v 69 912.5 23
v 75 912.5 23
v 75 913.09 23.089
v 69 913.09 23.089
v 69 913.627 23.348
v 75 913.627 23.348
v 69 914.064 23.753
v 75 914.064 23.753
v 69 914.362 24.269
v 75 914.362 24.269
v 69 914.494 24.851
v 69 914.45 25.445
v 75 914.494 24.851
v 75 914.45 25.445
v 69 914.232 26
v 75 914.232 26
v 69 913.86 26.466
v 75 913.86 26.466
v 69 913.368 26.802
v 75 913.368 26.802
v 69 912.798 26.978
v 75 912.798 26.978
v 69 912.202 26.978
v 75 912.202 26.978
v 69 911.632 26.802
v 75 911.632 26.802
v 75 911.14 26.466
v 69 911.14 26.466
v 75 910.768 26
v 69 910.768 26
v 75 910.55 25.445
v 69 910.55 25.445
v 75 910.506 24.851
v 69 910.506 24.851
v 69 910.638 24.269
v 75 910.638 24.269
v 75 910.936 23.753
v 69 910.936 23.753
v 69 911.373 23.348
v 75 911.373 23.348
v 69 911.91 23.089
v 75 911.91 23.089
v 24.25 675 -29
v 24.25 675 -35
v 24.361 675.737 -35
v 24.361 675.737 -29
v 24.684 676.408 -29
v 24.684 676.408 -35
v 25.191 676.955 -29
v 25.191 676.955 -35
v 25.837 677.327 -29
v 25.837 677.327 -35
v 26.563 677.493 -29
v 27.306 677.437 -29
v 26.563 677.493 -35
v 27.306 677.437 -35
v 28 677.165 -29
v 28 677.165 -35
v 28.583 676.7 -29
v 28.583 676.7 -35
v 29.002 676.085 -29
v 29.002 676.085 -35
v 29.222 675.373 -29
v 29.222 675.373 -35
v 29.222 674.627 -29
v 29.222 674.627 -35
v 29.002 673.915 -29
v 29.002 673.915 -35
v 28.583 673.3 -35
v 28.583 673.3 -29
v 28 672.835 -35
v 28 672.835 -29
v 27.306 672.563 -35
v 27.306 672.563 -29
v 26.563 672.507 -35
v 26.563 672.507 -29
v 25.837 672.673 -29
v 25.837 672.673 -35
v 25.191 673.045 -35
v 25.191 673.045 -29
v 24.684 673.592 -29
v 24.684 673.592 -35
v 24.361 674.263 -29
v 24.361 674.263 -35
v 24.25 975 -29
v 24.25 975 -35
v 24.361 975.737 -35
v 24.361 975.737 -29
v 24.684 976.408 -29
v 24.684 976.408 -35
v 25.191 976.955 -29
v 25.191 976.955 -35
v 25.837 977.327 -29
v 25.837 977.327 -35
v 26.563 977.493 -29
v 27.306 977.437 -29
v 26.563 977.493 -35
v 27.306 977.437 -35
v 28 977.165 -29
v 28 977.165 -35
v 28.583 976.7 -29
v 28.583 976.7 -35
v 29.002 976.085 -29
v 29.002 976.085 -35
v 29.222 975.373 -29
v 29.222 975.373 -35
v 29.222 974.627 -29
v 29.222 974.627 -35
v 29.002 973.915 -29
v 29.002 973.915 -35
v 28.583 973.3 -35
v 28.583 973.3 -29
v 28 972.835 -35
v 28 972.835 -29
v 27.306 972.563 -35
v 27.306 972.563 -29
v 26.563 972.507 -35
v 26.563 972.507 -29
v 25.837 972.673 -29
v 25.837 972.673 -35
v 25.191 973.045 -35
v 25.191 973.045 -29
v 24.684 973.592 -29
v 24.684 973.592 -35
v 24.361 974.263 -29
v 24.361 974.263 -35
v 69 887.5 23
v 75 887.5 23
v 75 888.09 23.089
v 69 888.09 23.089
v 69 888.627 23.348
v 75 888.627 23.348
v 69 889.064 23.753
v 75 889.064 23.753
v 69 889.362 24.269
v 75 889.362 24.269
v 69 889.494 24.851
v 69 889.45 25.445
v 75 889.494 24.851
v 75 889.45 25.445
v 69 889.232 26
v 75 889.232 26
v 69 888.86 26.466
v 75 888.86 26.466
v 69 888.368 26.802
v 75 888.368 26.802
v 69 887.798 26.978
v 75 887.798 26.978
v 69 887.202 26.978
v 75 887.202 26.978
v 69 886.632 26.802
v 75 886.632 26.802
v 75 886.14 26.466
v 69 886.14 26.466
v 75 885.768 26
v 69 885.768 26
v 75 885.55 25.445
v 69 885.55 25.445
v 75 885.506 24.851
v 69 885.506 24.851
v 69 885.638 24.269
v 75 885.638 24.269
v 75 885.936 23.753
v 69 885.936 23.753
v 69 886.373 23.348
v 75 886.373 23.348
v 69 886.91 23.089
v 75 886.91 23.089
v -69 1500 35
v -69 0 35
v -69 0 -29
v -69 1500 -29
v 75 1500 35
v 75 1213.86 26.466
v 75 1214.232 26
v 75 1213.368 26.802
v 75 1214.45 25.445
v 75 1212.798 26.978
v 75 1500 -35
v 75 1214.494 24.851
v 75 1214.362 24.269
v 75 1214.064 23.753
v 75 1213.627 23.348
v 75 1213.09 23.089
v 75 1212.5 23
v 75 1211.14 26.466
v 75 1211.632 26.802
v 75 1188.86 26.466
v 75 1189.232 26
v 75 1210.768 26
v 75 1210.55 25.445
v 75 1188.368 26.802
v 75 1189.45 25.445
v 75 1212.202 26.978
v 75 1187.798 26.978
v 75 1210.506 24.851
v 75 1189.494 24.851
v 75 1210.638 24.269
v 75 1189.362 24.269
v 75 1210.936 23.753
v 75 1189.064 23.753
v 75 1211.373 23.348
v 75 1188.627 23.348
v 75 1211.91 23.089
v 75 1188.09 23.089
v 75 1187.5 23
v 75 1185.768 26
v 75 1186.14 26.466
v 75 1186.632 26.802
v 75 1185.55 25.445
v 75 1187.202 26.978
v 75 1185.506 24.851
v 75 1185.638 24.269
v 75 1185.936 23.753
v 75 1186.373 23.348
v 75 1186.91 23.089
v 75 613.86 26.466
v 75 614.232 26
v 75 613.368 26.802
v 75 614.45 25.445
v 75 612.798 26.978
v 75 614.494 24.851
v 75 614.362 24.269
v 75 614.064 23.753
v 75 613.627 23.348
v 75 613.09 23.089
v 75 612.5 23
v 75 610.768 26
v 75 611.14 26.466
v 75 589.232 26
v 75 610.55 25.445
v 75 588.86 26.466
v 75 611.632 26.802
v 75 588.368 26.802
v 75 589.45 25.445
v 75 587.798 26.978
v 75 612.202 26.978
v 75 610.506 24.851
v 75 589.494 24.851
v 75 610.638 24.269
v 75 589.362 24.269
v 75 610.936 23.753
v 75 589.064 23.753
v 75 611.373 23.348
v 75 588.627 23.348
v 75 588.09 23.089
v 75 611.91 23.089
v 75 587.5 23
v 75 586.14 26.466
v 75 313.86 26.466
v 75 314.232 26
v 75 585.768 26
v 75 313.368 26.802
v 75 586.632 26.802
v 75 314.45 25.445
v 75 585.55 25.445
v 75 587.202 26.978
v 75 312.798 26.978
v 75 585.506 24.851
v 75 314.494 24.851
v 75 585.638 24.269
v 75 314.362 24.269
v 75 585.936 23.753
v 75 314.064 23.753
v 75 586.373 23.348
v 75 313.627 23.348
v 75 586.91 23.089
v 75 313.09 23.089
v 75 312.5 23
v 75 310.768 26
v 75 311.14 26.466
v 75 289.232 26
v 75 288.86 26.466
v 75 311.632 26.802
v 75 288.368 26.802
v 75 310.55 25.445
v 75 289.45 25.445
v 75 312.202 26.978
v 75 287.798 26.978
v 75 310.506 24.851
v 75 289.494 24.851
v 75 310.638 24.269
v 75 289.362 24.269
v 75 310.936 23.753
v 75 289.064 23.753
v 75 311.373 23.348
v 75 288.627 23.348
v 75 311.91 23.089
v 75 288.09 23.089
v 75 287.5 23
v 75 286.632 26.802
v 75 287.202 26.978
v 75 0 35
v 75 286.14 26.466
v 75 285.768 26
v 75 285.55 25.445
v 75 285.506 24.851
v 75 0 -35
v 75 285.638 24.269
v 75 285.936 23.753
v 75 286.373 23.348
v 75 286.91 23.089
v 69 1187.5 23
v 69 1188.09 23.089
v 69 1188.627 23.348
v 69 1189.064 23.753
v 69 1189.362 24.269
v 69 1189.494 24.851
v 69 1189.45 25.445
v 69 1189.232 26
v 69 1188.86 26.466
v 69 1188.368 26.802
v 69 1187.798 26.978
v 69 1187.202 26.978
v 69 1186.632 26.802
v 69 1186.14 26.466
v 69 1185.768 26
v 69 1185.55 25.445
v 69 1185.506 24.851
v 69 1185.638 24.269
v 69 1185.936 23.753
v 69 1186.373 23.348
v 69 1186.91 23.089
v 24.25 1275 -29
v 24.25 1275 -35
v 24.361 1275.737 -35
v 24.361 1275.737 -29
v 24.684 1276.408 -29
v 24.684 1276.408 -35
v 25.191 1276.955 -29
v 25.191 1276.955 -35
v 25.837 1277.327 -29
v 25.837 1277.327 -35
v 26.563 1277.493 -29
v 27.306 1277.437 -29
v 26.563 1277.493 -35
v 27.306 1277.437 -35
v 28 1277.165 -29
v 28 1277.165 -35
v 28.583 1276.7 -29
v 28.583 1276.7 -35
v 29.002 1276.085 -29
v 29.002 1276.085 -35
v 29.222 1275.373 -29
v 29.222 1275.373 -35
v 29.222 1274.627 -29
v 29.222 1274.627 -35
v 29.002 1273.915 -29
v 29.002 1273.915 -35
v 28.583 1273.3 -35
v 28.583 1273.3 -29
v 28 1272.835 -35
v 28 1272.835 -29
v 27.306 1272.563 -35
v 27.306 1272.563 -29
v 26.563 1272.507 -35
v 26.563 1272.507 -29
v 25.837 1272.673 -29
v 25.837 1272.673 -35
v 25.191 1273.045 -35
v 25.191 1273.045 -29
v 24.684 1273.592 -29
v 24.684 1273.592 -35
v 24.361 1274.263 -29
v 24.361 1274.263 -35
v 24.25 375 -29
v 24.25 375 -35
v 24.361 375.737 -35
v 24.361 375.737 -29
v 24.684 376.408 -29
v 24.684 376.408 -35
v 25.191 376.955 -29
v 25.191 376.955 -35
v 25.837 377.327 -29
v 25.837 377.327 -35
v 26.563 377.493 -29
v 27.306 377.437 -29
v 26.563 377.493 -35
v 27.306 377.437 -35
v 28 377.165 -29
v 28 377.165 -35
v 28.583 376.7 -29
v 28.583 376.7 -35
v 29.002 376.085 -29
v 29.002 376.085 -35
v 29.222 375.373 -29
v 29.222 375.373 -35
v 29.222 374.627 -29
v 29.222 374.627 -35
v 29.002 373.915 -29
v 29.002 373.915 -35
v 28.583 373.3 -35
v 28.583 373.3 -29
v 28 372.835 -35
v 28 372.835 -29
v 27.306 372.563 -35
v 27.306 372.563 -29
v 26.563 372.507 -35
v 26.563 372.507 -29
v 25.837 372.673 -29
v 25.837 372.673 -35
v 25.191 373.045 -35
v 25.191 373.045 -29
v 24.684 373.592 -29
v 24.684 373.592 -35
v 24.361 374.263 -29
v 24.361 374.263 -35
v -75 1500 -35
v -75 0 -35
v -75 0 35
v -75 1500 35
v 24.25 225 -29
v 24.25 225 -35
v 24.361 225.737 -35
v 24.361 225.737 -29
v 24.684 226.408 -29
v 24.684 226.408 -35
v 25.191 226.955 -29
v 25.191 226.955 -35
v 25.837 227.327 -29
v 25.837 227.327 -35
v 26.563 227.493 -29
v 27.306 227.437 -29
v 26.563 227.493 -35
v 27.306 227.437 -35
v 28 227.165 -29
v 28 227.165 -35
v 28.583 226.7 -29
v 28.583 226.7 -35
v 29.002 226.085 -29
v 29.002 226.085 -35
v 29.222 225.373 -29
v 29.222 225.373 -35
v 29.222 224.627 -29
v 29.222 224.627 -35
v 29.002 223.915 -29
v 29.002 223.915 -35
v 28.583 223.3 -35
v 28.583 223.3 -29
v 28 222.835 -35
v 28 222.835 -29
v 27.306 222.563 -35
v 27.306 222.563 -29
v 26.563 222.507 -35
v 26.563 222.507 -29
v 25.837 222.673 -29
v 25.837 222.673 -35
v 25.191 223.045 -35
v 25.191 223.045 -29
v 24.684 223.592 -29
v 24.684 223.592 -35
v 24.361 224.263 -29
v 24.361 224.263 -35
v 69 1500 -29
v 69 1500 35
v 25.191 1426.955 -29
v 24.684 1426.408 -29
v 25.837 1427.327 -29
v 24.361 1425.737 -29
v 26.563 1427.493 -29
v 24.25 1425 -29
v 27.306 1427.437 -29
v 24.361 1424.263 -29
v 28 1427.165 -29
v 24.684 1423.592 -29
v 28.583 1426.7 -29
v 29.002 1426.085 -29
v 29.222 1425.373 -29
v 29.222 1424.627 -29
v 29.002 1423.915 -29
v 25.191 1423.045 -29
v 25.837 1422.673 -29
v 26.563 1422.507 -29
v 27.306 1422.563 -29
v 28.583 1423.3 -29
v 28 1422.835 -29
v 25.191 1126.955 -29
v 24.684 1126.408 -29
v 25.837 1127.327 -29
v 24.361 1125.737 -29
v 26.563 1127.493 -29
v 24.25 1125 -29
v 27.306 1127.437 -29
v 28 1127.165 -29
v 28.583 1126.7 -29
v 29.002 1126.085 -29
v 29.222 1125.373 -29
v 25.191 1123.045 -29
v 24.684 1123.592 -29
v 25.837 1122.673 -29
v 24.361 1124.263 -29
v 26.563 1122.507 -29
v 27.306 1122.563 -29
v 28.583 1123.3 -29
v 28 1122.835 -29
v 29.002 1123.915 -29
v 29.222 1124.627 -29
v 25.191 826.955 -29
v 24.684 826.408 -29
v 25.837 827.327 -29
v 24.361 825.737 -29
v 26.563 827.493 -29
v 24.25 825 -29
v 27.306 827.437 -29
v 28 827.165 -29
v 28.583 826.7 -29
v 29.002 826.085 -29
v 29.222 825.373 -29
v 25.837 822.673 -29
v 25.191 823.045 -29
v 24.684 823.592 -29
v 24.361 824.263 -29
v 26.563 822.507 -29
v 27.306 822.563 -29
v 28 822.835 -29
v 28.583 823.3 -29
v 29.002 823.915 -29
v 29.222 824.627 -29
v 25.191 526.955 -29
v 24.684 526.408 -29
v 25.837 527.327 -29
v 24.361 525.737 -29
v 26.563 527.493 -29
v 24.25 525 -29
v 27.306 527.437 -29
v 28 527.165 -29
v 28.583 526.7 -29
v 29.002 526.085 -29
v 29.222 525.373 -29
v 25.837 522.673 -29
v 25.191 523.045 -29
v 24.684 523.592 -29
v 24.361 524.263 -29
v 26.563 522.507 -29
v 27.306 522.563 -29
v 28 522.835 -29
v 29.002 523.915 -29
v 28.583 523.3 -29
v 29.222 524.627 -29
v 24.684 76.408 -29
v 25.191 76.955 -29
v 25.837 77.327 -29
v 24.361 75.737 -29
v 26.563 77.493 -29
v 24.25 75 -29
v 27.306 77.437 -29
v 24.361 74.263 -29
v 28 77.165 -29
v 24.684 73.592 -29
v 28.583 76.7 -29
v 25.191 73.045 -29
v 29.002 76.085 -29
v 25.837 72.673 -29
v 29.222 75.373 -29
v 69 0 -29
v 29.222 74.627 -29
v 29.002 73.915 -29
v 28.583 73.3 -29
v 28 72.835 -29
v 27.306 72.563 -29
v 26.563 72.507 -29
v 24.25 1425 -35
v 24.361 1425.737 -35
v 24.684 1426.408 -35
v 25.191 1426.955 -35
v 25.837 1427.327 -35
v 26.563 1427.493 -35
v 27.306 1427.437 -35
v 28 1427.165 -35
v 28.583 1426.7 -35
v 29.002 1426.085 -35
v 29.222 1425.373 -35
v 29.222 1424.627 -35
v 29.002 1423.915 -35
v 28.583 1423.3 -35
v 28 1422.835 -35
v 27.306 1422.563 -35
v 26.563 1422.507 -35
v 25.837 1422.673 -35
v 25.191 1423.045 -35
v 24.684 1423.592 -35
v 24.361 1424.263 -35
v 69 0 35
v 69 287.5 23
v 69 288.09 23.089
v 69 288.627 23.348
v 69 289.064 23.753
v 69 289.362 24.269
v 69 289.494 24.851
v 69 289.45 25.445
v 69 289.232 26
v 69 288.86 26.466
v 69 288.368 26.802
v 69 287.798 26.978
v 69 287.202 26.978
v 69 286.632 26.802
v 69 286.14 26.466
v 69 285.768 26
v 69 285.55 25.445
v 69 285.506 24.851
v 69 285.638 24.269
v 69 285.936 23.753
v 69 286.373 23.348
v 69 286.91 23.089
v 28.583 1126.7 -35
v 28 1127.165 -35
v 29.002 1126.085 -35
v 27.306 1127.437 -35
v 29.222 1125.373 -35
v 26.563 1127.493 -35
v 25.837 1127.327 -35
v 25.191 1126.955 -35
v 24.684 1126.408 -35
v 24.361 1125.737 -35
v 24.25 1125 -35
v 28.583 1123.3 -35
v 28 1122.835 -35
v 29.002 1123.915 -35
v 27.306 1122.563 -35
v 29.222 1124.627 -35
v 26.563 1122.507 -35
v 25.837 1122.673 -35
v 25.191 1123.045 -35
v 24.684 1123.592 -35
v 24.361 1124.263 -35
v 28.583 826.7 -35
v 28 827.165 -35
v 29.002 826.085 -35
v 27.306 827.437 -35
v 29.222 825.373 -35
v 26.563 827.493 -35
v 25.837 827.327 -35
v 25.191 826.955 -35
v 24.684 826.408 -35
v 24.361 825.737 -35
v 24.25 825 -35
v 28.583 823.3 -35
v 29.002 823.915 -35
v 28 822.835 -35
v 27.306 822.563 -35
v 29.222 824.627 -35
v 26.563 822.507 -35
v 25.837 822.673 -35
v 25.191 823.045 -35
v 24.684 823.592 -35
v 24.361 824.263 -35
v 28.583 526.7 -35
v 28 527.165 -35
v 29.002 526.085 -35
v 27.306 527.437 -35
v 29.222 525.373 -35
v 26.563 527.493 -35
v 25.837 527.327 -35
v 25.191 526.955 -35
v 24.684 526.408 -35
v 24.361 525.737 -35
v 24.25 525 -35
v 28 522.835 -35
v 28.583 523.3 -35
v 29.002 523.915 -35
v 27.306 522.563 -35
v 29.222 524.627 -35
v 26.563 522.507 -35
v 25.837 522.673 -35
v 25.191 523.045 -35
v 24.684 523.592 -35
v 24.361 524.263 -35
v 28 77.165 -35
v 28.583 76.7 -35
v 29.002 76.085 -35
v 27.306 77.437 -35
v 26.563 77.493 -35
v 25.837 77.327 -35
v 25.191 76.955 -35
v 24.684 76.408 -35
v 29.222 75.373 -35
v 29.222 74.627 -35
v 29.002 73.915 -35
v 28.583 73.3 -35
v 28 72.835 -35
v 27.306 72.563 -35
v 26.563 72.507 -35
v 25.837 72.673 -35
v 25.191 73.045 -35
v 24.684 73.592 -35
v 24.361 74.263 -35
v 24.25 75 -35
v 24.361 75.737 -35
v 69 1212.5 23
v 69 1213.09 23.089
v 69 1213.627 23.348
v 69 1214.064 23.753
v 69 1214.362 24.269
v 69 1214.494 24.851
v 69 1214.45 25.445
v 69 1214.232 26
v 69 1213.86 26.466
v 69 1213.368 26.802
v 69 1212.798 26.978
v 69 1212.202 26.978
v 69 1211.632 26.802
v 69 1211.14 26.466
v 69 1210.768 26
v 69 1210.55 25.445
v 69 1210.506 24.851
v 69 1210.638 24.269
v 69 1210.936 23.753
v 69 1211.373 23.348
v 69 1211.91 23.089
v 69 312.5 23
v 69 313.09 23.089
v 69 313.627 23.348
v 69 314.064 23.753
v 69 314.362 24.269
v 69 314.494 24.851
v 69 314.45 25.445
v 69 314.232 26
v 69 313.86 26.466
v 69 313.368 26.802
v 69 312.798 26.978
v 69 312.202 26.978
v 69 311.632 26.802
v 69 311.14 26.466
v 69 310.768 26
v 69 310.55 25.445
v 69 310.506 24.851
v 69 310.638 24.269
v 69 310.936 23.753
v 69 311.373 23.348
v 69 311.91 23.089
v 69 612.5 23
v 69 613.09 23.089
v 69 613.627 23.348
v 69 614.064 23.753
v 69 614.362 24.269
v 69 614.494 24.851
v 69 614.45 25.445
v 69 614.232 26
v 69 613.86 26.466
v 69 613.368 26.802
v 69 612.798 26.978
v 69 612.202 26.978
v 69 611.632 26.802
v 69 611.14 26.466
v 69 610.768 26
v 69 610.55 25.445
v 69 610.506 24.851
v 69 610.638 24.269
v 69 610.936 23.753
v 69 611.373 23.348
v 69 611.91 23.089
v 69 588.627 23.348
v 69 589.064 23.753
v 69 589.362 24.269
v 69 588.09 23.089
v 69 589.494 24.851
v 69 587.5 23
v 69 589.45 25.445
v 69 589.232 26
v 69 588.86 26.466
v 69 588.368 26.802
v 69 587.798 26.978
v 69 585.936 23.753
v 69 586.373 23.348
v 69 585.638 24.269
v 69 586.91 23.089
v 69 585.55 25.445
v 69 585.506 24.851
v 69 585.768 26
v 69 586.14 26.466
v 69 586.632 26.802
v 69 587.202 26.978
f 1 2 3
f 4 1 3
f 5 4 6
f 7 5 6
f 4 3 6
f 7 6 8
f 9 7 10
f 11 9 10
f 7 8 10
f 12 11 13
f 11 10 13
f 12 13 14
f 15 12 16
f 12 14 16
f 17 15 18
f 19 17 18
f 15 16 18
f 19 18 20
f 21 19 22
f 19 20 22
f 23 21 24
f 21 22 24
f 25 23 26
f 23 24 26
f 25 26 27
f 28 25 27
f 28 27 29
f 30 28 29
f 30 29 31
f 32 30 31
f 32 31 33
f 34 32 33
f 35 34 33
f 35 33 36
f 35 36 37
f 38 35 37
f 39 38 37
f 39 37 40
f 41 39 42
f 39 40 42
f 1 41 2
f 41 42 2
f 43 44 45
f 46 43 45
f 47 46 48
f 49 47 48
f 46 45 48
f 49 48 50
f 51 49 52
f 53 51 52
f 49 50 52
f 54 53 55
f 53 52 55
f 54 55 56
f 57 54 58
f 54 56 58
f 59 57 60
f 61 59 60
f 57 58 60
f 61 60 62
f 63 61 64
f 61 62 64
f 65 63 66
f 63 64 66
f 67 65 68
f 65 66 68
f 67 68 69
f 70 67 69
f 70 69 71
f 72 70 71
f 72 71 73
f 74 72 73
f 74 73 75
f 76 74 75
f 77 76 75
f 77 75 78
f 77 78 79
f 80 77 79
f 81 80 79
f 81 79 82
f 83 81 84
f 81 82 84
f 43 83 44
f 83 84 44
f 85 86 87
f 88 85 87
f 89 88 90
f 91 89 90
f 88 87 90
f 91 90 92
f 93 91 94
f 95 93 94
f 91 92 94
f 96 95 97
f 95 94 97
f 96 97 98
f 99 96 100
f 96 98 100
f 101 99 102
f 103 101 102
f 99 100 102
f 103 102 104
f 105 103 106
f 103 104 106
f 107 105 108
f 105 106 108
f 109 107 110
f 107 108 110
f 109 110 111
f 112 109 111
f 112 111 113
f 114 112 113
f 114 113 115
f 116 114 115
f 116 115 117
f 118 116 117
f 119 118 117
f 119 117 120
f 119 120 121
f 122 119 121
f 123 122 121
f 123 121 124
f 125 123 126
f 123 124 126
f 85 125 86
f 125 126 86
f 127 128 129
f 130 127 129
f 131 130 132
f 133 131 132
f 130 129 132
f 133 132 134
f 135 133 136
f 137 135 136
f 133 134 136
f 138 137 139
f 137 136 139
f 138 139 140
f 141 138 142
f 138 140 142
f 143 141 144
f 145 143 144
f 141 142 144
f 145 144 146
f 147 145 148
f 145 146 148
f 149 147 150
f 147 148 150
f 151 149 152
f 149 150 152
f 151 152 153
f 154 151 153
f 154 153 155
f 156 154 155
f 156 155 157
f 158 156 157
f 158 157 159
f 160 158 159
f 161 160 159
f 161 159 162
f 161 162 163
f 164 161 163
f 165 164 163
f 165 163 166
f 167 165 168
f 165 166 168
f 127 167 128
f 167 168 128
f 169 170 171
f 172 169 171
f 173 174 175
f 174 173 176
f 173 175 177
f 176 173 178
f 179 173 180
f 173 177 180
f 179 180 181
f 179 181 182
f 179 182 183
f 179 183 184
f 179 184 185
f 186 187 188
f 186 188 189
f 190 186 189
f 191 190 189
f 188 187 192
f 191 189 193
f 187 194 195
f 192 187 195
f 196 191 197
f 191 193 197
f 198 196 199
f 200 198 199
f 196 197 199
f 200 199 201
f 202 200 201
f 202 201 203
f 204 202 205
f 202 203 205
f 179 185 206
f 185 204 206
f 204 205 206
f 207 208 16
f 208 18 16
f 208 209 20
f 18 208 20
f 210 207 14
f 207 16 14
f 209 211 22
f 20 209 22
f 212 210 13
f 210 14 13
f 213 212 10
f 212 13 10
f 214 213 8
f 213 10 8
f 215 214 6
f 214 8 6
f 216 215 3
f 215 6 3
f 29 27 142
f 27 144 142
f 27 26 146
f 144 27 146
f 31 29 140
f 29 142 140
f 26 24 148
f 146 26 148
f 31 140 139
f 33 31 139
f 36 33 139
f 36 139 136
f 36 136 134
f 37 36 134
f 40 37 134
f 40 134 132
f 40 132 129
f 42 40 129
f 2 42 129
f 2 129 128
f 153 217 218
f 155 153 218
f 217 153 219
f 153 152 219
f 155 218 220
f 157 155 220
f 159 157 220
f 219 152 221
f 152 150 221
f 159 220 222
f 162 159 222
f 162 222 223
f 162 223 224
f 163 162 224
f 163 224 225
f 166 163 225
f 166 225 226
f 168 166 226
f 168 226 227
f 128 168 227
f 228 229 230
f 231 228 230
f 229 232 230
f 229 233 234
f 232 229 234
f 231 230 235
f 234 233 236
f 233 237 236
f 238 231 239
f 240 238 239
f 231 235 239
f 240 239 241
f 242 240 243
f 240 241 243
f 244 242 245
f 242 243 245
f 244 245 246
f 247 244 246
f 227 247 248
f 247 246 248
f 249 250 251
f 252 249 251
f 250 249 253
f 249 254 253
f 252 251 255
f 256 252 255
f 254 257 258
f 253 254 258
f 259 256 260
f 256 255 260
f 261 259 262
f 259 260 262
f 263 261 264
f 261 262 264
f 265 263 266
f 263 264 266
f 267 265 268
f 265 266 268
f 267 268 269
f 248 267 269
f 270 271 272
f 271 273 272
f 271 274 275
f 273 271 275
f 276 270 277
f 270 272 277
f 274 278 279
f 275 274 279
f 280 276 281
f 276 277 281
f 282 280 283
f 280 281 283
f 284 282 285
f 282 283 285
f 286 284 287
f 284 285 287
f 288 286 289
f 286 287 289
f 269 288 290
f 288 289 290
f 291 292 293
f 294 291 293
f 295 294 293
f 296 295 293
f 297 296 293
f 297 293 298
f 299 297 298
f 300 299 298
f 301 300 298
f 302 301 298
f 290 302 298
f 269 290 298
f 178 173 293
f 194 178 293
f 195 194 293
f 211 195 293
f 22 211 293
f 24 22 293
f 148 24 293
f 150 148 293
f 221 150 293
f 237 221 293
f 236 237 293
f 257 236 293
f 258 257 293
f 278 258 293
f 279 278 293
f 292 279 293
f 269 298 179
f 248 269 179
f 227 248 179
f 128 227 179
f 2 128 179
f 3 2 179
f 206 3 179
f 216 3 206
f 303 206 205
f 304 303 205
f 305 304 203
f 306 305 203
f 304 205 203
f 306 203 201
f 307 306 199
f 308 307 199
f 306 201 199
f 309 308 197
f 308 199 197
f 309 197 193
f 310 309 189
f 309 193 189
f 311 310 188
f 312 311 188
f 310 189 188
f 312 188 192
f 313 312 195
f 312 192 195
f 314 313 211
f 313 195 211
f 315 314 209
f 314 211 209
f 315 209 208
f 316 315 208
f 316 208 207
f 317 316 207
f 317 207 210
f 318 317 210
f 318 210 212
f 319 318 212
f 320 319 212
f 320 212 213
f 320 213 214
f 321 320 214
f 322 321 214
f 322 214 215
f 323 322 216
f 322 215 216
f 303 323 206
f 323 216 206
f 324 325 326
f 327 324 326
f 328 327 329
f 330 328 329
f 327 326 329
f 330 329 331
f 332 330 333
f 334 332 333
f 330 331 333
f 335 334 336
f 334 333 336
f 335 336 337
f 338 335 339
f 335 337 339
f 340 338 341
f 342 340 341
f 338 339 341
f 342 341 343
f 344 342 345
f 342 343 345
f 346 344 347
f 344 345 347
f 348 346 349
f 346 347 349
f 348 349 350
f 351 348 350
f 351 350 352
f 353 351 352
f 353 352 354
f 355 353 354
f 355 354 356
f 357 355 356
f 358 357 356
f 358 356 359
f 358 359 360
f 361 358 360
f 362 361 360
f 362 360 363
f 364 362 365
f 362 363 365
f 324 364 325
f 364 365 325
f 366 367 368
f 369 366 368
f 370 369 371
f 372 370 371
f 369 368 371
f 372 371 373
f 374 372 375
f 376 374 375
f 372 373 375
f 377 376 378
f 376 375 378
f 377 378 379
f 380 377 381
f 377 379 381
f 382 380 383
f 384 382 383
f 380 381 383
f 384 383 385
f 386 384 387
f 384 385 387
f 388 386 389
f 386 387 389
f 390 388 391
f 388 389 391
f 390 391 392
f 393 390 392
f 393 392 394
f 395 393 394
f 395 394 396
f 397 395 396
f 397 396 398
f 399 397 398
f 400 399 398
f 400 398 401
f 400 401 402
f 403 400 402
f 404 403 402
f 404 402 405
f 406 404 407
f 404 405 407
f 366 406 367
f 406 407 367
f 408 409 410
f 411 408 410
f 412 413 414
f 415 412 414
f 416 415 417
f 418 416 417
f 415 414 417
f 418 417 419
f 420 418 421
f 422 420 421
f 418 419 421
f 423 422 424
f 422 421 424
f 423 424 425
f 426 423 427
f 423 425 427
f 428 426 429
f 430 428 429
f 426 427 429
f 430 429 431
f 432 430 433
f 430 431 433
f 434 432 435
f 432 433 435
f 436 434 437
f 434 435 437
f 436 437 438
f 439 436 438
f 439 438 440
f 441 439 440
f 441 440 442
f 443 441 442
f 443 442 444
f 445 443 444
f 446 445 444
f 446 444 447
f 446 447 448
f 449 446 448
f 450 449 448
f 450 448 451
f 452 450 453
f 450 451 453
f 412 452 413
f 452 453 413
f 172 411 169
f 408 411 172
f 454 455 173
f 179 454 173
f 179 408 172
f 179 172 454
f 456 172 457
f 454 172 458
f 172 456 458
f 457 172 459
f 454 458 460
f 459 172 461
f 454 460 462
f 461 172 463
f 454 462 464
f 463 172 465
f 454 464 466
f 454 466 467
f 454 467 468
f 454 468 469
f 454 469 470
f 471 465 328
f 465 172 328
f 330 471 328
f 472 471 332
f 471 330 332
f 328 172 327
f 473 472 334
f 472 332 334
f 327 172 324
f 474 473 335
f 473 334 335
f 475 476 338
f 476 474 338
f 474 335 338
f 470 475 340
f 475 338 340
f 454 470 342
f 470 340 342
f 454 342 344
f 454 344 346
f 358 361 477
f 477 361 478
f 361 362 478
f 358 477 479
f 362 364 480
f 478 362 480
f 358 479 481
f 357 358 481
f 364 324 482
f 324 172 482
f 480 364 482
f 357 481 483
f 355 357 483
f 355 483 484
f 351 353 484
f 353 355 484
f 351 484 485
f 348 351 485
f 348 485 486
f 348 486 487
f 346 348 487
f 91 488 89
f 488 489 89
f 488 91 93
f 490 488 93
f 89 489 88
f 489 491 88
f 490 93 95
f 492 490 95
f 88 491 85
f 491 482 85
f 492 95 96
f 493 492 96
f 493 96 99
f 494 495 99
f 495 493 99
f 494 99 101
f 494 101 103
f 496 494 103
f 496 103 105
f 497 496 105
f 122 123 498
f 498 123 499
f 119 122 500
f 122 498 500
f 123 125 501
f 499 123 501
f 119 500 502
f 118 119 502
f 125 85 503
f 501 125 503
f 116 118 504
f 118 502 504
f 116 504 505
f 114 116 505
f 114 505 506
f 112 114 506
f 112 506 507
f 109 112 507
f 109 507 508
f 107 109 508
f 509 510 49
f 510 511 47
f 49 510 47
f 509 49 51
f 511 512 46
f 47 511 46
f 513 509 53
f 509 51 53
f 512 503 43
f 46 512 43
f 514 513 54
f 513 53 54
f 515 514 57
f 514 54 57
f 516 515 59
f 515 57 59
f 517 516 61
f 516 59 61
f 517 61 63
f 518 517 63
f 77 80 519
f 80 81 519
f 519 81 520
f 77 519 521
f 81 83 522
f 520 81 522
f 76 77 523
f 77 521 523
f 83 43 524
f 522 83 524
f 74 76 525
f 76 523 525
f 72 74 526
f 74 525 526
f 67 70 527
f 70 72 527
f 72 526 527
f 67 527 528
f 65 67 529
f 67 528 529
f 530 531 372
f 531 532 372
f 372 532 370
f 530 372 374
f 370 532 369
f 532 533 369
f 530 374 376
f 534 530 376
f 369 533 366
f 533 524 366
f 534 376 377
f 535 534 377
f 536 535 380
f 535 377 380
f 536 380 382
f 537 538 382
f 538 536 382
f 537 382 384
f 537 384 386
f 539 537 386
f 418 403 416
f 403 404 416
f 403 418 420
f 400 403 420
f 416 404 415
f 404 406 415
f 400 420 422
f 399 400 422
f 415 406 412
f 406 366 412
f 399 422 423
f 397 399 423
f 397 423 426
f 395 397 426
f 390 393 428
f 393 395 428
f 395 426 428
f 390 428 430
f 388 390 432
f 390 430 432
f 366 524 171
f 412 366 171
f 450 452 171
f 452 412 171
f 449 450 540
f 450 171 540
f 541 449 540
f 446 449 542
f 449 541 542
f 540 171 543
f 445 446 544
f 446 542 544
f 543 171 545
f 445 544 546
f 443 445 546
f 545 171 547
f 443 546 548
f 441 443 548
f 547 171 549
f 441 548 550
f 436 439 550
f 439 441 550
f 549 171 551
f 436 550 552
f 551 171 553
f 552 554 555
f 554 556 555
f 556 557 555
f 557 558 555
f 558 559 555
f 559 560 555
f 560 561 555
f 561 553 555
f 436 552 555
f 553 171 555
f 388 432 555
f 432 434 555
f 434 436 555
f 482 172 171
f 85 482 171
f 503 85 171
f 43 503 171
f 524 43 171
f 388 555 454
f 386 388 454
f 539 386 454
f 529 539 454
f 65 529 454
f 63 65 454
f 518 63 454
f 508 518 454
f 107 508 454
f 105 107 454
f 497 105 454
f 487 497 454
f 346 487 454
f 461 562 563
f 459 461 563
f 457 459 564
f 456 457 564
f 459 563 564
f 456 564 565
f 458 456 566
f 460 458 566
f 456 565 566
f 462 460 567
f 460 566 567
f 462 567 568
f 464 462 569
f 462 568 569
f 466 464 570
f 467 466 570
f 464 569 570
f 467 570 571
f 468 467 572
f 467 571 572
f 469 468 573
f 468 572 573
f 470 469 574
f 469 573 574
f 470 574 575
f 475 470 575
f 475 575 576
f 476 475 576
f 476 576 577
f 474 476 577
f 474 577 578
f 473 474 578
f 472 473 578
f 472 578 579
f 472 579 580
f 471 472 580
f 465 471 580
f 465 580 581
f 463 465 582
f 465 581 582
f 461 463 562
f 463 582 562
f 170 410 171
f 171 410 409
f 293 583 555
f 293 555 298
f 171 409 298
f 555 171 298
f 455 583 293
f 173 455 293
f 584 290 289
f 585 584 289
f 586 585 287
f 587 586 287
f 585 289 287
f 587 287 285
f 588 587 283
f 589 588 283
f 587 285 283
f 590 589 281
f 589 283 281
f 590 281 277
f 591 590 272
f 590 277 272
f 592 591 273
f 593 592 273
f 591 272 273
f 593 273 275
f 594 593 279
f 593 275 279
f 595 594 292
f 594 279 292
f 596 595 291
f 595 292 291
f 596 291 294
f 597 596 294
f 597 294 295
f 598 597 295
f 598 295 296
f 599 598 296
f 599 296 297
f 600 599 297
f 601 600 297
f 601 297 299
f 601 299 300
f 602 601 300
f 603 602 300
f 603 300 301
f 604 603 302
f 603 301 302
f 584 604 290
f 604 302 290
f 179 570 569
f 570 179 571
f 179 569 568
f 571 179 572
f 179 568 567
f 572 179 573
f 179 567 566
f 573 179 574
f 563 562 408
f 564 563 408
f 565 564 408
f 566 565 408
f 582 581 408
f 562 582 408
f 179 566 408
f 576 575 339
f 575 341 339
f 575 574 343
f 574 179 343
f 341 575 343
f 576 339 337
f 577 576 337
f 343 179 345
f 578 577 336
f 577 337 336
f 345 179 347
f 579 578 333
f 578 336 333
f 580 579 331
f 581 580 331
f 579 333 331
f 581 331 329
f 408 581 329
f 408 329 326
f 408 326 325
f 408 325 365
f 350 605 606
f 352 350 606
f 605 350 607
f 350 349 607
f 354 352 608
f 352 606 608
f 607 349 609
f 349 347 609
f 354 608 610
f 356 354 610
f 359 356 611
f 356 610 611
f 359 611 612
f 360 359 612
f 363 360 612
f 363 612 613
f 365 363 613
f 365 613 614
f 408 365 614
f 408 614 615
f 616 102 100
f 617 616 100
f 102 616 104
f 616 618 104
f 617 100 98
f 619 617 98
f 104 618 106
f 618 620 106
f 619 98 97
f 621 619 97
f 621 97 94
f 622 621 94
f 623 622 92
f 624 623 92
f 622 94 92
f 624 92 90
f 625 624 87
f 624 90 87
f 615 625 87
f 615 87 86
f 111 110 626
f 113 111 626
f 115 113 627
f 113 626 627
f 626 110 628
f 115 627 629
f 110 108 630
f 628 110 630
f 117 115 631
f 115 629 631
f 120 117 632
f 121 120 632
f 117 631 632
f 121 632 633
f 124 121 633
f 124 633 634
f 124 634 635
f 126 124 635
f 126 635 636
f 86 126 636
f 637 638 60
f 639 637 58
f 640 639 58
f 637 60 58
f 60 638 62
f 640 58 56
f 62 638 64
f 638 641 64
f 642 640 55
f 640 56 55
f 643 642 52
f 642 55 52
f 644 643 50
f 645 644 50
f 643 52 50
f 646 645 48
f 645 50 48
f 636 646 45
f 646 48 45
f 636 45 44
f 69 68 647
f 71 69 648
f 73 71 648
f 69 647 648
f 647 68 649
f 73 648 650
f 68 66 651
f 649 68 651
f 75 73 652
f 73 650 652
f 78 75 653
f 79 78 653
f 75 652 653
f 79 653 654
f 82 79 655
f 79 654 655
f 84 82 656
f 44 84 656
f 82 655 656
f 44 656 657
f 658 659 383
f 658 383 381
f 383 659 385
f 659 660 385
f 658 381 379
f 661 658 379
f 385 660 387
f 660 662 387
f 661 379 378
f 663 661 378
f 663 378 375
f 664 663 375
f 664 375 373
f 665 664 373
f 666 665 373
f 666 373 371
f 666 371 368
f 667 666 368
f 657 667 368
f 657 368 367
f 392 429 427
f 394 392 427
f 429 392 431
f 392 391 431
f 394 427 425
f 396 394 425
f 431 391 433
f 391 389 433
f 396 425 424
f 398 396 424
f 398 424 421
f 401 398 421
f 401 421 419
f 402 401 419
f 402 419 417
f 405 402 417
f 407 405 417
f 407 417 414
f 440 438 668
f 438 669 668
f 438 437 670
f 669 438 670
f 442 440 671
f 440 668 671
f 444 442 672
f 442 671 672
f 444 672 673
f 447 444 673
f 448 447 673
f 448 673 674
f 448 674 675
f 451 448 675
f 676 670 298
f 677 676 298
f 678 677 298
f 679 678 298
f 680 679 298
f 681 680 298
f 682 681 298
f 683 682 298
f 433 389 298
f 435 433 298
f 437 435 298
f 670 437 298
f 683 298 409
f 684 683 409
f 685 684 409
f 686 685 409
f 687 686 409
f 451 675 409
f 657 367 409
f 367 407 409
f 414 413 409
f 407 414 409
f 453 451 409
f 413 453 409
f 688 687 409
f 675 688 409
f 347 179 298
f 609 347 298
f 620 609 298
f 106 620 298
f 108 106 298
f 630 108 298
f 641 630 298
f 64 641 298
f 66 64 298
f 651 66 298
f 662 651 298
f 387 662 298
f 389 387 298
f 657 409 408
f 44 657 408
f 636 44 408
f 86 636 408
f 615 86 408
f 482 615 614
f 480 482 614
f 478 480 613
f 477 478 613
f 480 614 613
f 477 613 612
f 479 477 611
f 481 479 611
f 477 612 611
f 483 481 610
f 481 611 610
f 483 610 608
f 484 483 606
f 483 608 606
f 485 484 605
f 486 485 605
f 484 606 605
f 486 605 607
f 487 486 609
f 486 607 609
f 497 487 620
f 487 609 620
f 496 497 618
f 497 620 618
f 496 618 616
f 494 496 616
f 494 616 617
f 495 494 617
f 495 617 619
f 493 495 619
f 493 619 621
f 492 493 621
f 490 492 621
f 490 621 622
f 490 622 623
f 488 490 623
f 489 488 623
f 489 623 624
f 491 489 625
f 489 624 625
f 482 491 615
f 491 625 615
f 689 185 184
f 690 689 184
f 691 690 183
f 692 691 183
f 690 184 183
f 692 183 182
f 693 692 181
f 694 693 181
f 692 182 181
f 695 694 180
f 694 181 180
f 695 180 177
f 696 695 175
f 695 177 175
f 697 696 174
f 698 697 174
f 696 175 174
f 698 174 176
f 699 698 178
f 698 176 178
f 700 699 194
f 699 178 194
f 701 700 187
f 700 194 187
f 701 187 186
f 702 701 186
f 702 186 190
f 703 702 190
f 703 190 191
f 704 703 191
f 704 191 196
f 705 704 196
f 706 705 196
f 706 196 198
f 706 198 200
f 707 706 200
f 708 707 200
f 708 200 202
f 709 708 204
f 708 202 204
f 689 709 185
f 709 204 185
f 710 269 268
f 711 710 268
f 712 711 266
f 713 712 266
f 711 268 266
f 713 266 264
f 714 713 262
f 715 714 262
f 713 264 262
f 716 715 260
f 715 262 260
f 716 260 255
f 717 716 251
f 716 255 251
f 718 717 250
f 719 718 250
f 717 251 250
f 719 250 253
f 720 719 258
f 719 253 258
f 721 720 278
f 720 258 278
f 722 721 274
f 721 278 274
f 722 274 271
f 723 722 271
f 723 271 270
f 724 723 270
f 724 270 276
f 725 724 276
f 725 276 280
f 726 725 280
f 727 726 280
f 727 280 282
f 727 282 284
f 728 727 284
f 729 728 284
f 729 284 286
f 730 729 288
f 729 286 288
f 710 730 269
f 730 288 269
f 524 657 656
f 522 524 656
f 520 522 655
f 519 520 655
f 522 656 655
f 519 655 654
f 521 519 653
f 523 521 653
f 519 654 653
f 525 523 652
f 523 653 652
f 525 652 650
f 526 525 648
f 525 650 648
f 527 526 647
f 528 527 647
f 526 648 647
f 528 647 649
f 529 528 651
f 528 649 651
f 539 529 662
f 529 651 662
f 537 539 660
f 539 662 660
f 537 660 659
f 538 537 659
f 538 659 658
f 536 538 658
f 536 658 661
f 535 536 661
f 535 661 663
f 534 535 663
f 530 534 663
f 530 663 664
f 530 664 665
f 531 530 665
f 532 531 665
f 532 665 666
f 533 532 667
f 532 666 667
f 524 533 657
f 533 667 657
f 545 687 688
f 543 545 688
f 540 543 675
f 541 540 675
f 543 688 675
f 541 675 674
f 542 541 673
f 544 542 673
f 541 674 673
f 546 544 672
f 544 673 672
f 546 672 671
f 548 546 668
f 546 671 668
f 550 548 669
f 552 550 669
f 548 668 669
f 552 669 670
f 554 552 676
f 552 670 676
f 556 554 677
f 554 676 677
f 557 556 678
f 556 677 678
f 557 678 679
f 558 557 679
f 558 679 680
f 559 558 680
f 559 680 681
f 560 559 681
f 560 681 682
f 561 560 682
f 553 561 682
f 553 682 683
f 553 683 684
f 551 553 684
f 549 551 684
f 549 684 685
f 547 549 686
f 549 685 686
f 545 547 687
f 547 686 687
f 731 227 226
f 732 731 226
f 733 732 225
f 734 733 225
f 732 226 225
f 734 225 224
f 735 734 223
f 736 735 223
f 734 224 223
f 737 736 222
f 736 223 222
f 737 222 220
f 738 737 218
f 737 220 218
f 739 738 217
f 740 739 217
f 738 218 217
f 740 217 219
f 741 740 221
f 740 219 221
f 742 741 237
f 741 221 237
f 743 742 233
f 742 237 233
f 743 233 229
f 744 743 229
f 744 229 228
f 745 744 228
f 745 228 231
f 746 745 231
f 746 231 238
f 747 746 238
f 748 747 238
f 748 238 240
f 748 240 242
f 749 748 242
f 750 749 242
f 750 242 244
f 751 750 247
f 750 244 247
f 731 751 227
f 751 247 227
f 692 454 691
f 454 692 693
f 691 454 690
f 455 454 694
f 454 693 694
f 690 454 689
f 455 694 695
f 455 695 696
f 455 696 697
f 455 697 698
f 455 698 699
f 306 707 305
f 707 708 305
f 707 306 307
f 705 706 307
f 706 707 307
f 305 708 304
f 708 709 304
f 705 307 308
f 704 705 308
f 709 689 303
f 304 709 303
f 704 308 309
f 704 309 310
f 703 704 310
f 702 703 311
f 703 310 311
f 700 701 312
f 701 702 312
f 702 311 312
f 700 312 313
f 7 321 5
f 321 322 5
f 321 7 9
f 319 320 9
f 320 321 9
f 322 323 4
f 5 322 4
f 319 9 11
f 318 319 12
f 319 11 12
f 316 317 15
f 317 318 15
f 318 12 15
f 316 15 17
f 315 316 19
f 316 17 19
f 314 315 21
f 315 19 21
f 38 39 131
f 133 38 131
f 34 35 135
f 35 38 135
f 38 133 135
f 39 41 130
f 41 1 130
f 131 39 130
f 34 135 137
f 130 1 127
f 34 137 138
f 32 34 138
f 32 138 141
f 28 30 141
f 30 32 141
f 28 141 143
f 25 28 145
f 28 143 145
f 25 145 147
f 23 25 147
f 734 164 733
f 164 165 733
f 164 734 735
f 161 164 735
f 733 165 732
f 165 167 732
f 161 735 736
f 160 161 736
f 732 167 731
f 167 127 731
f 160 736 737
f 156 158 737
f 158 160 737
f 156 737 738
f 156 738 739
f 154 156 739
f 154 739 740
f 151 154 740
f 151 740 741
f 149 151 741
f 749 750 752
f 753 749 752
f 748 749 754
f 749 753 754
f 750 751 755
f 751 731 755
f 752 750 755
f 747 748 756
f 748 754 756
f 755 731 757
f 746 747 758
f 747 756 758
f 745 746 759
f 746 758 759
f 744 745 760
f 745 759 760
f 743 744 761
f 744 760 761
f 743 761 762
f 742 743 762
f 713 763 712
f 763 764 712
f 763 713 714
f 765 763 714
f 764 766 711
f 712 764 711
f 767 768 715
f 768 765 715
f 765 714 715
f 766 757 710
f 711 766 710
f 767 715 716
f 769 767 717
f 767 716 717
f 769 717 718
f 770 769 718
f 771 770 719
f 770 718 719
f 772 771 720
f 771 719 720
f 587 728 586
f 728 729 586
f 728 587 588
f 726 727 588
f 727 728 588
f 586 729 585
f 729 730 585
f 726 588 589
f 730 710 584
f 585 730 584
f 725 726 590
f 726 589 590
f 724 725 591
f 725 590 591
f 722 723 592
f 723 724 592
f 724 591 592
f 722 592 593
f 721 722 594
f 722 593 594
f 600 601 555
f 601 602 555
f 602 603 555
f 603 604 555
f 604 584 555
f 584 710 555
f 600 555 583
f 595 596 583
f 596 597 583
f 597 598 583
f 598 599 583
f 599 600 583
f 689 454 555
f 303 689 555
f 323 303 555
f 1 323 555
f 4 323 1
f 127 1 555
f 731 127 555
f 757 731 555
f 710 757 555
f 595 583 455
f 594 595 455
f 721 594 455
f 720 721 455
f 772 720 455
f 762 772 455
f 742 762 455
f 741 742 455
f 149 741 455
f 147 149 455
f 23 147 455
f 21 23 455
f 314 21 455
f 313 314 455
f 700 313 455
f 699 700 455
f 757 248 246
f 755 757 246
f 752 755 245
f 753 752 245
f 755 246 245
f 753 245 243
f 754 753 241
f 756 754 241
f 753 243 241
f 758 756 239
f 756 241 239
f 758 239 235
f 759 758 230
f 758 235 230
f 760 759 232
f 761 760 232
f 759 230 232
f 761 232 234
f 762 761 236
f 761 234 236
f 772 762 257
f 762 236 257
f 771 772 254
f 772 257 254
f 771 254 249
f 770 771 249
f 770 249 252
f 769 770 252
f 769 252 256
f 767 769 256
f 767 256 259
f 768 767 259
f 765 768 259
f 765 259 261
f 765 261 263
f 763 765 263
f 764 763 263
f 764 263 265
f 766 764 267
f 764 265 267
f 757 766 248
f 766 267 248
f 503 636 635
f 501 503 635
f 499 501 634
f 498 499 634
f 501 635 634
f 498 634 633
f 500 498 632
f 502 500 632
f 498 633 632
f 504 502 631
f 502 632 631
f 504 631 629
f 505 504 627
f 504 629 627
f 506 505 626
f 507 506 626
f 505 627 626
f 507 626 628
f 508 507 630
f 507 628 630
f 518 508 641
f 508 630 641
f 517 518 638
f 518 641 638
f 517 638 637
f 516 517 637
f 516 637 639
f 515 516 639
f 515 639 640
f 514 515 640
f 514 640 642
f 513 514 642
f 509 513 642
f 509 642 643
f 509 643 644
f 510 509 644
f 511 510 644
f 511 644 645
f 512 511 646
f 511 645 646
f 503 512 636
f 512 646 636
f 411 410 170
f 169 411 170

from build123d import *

# Parameters (mm, degrees)
BOSS_EXTRUDE1_DEPTH = 1500
SKETCH2_R           = 2
CUT_EXTRUDE1_DEPTH  = 6
SKETCH3_R           = 2.5
CUT_EXTRUDE2_DEPTH  = 6


with BuildPart() as part:
    # Sketch1 → Boss-Extrude1 (new body)
    with BuildSketch(Plane(origin=(0, 0, 0), x_dir=(1, 0, 0), z_dir=(0, 1, 0))):
        Polygon((-75, 35), (-75, -35), (-69, -35), (-69, 29), (69, 29), (69, -35), (75, -35), (75, 35), align=None)
    extrude(amount=BOSS_EXTRUDE1_DEPTH)

    # Sketch2 → Cut-Extrude1 (cut)
    with BuildSketch(Plane(origin=(75, 0, 0), x_dir=(0, 0, -1), z_dir=(1, 0, 0))):
        with Locations((-25, 312.5)):
            Circle(SKETCH2_R)
        with Locations((-25, 287.5)):
            Circle(SKETCH2_R)
        with Locations((-25, 587.5)):
            Circle(SKETCH2_R)
        with Locations((-25, 612.5)):
            Circle(SKETCH2_R)
        with Locations((-25, 1212.5)):
            Circle(SKETCH2_R)
        with Locations((-25, 1187.5)):
            Circle(SKETCH2_R)
        with Locations((-25, 887.5)):
            Circle(SKETCH2_R)
        with Locations((-25, 912.5)):
            Circle(SKETCH2_R)
    extrude(amount=-CUT_EXTRUDE1_DEPTH, mode=Mode.SUBTRACT)

    # Sketch3 → Cut-Extrude2 (cut)
    with BuildSketch(Plane(origin=(0, 0, -35), x_dir=(-1, 0, 0), z_dir=(0, 0, -1))):
        with Locations((-26.75, 75)):
            Circle(SKETCH3_R)
        with Locations((-26.75, 225)):
            Circle(SKETCH3_R)
        with Locations((-26.75, 375)):
            Circle(SKETCH3_R)
        with Locations((-26.75, 525)):
            Circle(SKETCH3_R)
        with Locations((-26.75, 675)):
            Circle(SKETCH3_R)
        with Locations((-26.75, 825)):
            Circle(SKETCH3_R)
        with Locations((-26.75, 975)):
            Circle(SKETCH3_R)
        with Locations((-26.75, 1125)):
            Circle(SKETCH3_R)
        with Locations((-26.75, 1275)):
            Circle(SKETCH3_R)
        with Locations((-26.75, 1425)):
            Circle(SKETCH3_R)
    extrude(amount=-CUT_EXTRUDE2_DEPTH, mode=Mode.SUBTRACT)


solid = part.part
